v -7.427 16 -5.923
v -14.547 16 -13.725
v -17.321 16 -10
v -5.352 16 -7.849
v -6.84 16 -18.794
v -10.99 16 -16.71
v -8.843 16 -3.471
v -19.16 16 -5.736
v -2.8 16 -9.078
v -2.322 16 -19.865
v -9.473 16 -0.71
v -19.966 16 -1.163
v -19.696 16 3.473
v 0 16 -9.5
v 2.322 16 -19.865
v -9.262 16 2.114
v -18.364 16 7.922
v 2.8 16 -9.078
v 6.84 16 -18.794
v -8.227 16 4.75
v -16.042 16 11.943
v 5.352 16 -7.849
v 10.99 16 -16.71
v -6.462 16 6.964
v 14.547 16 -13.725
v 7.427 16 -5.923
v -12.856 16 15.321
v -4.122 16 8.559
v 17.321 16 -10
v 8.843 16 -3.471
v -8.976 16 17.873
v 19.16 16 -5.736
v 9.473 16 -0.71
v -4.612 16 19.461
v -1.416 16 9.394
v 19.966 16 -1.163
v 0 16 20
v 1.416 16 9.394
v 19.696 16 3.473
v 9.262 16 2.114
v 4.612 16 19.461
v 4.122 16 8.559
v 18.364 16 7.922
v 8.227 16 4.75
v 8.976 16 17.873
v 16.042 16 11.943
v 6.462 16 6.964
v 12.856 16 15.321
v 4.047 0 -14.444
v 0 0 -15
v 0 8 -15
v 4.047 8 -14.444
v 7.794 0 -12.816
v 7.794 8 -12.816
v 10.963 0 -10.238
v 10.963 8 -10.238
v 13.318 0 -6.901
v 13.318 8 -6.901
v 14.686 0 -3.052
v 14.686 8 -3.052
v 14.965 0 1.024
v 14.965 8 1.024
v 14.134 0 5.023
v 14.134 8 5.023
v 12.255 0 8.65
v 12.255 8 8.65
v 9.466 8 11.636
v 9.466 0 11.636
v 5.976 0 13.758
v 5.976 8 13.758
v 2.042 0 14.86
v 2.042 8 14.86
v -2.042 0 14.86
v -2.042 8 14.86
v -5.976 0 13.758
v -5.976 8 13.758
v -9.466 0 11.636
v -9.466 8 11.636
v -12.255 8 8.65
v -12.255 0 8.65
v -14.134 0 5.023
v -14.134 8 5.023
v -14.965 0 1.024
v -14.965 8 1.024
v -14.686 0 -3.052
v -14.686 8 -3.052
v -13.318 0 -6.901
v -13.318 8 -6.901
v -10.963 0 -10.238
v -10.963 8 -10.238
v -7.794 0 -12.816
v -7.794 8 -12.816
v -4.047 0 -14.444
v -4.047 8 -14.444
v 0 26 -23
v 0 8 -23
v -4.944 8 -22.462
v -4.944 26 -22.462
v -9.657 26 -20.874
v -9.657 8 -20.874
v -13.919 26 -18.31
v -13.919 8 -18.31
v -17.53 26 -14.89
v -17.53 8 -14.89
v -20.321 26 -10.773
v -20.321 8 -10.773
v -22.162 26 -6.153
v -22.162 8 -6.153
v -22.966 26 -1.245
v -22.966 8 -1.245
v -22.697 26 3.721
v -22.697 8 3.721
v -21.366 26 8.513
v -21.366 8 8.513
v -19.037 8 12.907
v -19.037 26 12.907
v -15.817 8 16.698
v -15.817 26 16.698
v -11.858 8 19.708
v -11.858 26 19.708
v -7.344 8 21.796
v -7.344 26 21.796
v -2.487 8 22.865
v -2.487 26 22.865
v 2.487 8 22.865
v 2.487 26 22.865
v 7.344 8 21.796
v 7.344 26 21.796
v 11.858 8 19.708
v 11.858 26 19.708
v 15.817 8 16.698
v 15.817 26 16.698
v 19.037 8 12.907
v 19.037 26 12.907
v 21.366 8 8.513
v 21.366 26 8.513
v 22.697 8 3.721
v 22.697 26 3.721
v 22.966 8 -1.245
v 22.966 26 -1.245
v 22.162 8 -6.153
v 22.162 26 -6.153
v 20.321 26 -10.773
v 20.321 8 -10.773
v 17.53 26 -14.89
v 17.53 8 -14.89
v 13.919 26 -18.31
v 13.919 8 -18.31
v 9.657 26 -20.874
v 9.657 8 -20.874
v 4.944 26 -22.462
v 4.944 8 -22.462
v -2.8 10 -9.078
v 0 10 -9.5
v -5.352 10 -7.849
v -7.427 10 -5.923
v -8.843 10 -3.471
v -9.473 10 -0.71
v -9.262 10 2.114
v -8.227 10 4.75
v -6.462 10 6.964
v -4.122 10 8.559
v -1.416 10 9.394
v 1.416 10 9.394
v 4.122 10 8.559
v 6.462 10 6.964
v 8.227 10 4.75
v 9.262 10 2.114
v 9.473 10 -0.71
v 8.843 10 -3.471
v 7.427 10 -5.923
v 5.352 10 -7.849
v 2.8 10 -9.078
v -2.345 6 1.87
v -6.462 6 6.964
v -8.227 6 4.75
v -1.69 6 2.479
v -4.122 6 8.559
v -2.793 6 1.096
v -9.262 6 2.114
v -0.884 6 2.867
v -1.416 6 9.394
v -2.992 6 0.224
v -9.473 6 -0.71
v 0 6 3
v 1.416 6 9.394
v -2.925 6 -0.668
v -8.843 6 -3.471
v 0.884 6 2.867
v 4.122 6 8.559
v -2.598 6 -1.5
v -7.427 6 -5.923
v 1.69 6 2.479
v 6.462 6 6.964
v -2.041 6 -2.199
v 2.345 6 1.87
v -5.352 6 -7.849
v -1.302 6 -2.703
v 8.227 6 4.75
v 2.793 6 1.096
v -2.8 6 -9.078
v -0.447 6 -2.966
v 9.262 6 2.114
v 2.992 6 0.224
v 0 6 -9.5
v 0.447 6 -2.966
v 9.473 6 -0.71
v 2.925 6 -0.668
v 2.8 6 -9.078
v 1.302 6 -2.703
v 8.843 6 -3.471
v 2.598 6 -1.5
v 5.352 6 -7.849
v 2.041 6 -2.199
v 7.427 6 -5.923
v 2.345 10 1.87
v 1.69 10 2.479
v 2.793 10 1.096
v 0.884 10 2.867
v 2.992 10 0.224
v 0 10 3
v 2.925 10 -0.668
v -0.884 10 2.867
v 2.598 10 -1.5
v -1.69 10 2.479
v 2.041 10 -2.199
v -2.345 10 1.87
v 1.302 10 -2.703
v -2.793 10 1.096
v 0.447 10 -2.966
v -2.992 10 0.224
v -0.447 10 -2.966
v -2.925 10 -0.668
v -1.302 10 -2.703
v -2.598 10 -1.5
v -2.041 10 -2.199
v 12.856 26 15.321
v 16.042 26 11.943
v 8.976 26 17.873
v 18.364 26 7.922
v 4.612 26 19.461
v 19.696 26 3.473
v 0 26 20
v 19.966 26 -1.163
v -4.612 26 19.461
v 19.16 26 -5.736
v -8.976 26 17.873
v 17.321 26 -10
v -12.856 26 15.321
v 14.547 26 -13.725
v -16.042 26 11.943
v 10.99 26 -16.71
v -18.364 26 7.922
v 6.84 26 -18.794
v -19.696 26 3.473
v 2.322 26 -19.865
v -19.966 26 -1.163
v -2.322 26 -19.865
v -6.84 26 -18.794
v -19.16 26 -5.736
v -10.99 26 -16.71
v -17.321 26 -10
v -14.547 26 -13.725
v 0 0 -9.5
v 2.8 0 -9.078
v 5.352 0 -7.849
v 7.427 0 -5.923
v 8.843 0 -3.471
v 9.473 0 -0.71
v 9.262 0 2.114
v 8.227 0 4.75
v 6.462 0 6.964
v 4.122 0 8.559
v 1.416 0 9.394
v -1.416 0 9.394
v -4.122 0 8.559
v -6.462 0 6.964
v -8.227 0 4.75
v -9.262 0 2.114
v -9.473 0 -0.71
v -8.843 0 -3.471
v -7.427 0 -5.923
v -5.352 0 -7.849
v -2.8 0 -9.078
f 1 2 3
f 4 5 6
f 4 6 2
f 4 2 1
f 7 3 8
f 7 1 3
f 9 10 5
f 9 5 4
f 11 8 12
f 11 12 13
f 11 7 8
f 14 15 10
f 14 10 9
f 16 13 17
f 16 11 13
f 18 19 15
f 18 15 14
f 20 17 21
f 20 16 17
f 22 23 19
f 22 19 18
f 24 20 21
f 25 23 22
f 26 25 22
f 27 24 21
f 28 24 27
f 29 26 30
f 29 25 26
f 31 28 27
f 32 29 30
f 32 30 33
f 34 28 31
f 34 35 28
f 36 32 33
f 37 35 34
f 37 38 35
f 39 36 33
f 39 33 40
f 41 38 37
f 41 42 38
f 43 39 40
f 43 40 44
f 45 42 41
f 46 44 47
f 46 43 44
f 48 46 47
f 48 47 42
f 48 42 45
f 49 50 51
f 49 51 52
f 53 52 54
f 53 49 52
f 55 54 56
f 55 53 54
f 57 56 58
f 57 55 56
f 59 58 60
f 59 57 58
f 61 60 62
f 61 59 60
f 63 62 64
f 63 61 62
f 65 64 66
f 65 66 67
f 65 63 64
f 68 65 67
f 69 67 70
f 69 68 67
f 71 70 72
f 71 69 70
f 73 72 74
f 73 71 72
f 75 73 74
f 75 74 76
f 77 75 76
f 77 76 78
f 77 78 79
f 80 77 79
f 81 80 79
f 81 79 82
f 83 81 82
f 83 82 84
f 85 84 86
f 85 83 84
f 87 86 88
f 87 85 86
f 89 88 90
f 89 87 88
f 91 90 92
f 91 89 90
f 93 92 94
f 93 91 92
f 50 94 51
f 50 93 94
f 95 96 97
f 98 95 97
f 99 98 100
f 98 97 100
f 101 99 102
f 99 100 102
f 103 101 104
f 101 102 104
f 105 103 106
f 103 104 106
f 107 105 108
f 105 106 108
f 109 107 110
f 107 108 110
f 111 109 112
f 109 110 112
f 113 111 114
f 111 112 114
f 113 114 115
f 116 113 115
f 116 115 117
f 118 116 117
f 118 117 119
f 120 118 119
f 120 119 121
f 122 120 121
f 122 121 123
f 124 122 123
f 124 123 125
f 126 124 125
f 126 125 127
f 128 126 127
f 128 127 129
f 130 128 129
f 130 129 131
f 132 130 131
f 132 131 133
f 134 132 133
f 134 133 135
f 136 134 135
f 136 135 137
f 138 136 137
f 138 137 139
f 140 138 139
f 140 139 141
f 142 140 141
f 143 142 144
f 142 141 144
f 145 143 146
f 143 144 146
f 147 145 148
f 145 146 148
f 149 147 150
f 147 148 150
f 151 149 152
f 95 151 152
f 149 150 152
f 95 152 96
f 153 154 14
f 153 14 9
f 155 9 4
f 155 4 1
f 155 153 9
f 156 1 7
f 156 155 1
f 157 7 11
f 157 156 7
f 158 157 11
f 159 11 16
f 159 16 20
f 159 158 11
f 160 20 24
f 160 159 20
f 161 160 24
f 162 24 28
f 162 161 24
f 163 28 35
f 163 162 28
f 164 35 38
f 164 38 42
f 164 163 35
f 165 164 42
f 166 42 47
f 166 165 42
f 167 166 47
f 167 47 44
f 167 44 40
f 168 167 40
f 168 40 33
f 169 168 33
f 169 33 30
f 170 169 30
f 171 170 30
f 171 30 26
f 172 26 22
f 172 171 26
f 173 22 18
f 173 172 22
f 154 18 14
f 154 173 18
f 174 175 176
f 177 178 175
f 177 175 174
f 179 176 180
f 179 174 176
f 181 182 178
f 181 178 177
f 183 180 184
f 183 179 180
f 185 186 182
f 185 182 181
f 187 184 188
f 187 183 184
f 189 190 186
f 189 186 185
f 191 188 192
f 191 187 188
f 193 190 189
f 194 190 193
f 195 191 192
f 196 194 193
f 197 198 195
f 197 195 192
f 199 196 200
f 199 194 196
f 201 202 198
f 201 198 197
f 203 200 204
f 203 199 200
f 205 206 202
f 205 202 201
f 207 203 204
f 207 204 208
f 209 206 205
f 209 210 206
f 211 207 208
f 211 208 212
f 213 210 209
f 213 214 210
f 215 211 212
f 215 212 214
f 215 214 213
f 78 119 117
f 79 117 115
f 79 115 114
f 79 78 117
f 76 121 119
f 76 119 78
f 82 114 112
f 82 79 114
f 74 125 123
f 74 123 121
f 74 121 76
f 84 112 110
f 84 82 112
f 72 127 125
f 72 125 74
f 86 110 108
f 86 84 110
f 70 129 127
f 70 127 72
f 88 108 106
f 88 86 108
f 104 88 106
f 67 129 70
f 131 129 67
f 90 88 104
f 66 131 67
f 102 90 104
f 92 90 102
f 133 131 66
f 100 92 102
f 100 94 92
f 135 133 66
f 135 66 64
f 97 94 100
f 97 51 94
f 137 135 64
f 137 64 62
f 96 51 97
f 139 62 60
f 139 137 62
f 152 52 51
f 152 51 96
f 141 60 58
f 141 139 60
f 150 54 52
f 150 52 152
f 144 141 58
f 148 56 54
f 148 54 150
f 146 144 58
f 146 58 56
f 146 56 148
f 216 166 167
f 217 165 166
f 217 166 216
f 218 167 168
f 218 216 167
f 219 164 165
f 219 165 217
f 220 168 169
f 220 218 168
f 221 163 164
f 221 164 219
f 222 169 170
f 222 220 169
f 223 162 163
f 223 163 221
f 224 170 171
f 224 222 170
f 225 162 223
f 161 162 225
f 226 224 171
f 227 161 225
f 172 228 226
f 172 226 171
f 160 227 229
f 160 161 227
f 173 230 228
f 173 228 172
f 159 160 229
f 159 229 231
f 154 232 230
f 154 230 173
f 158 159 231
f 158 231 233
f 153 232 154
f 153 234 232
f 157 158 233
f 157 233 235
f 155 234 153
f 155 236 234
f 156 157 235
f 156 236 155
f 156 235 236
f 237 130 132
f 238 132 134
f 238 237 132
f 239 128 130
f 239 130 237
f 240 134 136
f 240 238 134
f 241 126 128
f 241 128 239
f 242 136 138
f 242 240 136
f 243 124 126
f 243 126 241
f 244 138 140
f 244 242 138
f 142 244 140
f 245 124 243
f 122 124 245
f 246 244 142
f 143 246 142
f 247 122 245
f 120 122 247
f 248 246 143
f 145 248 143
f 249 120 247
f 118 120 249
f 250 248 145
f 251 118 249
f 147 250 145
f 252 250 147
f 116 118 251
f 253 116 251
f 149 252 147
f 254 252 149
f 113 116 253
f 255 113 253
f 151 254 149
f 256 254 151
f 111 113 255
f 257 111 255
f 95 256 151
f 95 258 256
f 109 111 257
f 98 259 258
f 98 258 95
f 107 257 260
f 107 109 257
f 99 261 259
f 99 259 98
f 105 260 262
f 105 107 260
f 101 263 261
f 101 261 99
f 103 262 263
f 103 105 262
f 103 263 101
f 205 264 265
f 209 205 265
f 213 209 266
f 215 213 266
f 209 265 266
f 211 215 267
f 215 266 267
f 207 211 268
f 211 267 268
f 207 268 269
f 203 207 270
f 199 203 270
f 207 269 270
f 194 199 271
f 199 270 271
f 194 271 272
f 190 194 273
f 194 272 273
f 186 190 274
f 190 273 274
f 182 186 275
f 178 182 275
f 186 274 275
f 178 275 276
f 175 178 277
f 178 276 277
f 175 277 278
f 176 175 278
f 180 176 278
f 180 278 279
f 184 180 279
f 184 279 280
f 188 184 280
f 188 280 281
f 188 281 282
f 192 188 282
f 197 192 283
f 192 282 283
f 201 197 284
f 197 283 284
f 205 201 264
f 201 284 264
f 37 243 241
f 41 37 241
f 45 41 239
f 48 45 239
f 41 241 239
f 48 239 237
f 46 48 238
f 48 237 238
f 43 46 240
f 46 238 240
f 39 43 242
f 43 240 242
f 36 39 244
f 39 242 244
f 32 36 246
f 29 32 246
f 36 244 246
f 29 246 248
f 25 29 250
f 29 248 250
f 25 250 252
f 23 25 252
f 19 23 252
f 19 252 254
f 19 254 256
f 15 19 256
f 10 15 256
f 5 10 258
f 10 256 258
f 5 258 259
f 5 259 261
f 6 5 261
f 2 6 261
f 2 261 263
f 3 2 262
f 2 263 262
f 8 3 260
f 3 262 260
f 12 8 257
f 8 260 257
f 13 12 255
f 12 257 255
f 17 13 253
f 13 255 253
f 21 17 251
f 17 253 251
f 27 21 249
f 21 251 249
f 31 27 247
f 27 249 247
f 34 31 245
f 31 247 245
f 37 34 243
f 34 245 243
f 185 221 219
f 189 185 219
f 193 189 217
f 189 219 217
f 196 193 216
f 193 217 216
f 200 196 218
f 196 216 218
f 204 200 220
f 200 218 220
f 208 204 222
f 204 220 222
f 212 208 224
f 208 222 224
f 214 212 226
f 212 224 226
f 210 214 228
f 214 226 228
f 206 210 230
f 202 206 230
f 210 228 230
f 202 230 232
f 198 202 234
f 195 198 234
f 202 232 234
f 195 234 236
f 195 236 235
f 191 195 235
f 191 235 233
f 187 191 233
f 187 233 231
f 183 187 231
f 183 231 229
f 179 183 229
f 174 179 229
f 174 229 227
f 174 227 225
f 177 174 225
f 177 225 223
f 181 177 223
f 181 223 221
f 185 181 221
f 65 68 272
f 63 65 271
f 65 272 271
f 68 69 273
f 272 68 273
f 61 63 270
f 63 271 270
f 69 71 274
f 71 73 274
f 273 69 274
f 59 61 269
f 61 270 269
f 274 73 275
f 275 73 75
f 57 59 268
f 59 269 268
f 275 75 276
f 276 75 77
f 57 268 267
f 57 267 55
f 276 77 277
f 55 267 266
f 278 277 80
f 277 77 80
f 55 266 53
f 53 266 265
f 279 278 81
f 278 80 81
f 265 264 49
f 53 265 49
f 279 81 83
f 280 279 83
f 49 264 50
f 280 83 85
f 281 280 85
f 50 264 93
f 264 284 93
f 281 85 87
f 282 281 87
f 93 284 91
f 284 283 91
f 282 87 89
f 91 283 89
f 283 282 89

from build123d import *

# Parameters (mm, degrees)
SKETCH_1_R           = 23
EXTRUDE_1_DEPTH      = 26
SKETCH_7_R           = 23
SKETCH_7_R_2         = 15
CUT_EXTRUDE_5_DEPTH  = 8
SKETCH_8_R           = 9.5
CUT_EXTRUDE_6_DEPTH  = 6
SKETCH_9_R           = 3
CUT_EXTRUDE_7_DEPTH  = 24.5
SKETCH_10_R          = 20
CUT_EXTRUDE_8_DEPTH  = 10
CUT_EXTRUDE_START    = -6
SKETCH_11_R          = 9.5
CUT_EXTRUDE_10_DEPTH = 6


with BuildPart() as part:
    # 스케치1 → 보스-돌출1 (new body)
    with BuildSketch(Plane(origin=(0, 0, 0), x_dir=(1, 0, 0), z_dir=(0, 1, 0))):
        with Locations(Location((0, 0, 0), (0, 0, 90))):
            Circle(SKETCH_1_R)
    extrude(amount=EXTRUDE_1_DEPTH)

    # 스케치7 → 컷-돌출5 (cut)
    with BuildSketch(Plane(origin=(0, 0, 0), x_dir=(-1, 0, 0), z_dir=(0, -1, 0))):
        with Locations(Location((0, 0, 0), (0, 0, 90))):
            Circle(SKETCH_7_R)
        with Locations(Location((0, 0, 0), (0, 0, 90))):
            Circle(SKETCH_7_R_2, mode=Mode.SUBTRACT)
    extrude(amount=-CUT_EXTRUDE_5_DEPTH, mode=Mode.SUBTRACT)

    # 스케치8 → 컷-돌출6 (cut)
    with BuildSketch(Plane.XZ):
        with Locations(Location((0, 0, 0), (0, 0, 270))):
            Circle(SKETCH_8_R)
    extrude(amount=-CUT_EXTRUDE_6_DEPTH, mode=Mode.SUBTRACT)

    # 스케치9 → 컷-돌출7 (cut)
    with BuildSketch(Plane(origin=(0, 26, 0), x_dir=(1, 0, 0), z_dir=(0, 1, 0))):
        with Locations(Location((0, 0, 0), (0, 0, 270))):
            Circle(SKETCH_9_R)
    extrude(amount=-CUT_EXTRUDE_7_DEPTH, mode=Mode.SUBTRACT)

    # 스케치10 → 컷-돌출8 (cut)
    with BuildSketch(Plane(origin=(0, 26, 0), x_dir=(1, 0, 0), z_dir=(0, 1, 0))):
        with Locations(Location((0, 0, 0), (0, 0, 270))):
            Circle(SKETCH_10_R)
    extrude(amount=-CUT_EXTRUDE_8_DEPTH, mode=Mode.SUBTRACT)

    # 스케치11 → 컷-돌출10 (cut)
    with BuildSketch(Plane(origin=(0, 16, 0), x_dir=(1, 0, 0), z_dir=(0, 1, 0)).offset(CUT_EXTRUDE_START)):
        with Locations(Location((0, 0, 0), (0, 0, 90))):
            Circle(SKETCH_11_R)
    extrude(amount=CUT_EXTRUDE_10_DEPTH, mode=Mode.SUBTRACT)


solid = part.part
